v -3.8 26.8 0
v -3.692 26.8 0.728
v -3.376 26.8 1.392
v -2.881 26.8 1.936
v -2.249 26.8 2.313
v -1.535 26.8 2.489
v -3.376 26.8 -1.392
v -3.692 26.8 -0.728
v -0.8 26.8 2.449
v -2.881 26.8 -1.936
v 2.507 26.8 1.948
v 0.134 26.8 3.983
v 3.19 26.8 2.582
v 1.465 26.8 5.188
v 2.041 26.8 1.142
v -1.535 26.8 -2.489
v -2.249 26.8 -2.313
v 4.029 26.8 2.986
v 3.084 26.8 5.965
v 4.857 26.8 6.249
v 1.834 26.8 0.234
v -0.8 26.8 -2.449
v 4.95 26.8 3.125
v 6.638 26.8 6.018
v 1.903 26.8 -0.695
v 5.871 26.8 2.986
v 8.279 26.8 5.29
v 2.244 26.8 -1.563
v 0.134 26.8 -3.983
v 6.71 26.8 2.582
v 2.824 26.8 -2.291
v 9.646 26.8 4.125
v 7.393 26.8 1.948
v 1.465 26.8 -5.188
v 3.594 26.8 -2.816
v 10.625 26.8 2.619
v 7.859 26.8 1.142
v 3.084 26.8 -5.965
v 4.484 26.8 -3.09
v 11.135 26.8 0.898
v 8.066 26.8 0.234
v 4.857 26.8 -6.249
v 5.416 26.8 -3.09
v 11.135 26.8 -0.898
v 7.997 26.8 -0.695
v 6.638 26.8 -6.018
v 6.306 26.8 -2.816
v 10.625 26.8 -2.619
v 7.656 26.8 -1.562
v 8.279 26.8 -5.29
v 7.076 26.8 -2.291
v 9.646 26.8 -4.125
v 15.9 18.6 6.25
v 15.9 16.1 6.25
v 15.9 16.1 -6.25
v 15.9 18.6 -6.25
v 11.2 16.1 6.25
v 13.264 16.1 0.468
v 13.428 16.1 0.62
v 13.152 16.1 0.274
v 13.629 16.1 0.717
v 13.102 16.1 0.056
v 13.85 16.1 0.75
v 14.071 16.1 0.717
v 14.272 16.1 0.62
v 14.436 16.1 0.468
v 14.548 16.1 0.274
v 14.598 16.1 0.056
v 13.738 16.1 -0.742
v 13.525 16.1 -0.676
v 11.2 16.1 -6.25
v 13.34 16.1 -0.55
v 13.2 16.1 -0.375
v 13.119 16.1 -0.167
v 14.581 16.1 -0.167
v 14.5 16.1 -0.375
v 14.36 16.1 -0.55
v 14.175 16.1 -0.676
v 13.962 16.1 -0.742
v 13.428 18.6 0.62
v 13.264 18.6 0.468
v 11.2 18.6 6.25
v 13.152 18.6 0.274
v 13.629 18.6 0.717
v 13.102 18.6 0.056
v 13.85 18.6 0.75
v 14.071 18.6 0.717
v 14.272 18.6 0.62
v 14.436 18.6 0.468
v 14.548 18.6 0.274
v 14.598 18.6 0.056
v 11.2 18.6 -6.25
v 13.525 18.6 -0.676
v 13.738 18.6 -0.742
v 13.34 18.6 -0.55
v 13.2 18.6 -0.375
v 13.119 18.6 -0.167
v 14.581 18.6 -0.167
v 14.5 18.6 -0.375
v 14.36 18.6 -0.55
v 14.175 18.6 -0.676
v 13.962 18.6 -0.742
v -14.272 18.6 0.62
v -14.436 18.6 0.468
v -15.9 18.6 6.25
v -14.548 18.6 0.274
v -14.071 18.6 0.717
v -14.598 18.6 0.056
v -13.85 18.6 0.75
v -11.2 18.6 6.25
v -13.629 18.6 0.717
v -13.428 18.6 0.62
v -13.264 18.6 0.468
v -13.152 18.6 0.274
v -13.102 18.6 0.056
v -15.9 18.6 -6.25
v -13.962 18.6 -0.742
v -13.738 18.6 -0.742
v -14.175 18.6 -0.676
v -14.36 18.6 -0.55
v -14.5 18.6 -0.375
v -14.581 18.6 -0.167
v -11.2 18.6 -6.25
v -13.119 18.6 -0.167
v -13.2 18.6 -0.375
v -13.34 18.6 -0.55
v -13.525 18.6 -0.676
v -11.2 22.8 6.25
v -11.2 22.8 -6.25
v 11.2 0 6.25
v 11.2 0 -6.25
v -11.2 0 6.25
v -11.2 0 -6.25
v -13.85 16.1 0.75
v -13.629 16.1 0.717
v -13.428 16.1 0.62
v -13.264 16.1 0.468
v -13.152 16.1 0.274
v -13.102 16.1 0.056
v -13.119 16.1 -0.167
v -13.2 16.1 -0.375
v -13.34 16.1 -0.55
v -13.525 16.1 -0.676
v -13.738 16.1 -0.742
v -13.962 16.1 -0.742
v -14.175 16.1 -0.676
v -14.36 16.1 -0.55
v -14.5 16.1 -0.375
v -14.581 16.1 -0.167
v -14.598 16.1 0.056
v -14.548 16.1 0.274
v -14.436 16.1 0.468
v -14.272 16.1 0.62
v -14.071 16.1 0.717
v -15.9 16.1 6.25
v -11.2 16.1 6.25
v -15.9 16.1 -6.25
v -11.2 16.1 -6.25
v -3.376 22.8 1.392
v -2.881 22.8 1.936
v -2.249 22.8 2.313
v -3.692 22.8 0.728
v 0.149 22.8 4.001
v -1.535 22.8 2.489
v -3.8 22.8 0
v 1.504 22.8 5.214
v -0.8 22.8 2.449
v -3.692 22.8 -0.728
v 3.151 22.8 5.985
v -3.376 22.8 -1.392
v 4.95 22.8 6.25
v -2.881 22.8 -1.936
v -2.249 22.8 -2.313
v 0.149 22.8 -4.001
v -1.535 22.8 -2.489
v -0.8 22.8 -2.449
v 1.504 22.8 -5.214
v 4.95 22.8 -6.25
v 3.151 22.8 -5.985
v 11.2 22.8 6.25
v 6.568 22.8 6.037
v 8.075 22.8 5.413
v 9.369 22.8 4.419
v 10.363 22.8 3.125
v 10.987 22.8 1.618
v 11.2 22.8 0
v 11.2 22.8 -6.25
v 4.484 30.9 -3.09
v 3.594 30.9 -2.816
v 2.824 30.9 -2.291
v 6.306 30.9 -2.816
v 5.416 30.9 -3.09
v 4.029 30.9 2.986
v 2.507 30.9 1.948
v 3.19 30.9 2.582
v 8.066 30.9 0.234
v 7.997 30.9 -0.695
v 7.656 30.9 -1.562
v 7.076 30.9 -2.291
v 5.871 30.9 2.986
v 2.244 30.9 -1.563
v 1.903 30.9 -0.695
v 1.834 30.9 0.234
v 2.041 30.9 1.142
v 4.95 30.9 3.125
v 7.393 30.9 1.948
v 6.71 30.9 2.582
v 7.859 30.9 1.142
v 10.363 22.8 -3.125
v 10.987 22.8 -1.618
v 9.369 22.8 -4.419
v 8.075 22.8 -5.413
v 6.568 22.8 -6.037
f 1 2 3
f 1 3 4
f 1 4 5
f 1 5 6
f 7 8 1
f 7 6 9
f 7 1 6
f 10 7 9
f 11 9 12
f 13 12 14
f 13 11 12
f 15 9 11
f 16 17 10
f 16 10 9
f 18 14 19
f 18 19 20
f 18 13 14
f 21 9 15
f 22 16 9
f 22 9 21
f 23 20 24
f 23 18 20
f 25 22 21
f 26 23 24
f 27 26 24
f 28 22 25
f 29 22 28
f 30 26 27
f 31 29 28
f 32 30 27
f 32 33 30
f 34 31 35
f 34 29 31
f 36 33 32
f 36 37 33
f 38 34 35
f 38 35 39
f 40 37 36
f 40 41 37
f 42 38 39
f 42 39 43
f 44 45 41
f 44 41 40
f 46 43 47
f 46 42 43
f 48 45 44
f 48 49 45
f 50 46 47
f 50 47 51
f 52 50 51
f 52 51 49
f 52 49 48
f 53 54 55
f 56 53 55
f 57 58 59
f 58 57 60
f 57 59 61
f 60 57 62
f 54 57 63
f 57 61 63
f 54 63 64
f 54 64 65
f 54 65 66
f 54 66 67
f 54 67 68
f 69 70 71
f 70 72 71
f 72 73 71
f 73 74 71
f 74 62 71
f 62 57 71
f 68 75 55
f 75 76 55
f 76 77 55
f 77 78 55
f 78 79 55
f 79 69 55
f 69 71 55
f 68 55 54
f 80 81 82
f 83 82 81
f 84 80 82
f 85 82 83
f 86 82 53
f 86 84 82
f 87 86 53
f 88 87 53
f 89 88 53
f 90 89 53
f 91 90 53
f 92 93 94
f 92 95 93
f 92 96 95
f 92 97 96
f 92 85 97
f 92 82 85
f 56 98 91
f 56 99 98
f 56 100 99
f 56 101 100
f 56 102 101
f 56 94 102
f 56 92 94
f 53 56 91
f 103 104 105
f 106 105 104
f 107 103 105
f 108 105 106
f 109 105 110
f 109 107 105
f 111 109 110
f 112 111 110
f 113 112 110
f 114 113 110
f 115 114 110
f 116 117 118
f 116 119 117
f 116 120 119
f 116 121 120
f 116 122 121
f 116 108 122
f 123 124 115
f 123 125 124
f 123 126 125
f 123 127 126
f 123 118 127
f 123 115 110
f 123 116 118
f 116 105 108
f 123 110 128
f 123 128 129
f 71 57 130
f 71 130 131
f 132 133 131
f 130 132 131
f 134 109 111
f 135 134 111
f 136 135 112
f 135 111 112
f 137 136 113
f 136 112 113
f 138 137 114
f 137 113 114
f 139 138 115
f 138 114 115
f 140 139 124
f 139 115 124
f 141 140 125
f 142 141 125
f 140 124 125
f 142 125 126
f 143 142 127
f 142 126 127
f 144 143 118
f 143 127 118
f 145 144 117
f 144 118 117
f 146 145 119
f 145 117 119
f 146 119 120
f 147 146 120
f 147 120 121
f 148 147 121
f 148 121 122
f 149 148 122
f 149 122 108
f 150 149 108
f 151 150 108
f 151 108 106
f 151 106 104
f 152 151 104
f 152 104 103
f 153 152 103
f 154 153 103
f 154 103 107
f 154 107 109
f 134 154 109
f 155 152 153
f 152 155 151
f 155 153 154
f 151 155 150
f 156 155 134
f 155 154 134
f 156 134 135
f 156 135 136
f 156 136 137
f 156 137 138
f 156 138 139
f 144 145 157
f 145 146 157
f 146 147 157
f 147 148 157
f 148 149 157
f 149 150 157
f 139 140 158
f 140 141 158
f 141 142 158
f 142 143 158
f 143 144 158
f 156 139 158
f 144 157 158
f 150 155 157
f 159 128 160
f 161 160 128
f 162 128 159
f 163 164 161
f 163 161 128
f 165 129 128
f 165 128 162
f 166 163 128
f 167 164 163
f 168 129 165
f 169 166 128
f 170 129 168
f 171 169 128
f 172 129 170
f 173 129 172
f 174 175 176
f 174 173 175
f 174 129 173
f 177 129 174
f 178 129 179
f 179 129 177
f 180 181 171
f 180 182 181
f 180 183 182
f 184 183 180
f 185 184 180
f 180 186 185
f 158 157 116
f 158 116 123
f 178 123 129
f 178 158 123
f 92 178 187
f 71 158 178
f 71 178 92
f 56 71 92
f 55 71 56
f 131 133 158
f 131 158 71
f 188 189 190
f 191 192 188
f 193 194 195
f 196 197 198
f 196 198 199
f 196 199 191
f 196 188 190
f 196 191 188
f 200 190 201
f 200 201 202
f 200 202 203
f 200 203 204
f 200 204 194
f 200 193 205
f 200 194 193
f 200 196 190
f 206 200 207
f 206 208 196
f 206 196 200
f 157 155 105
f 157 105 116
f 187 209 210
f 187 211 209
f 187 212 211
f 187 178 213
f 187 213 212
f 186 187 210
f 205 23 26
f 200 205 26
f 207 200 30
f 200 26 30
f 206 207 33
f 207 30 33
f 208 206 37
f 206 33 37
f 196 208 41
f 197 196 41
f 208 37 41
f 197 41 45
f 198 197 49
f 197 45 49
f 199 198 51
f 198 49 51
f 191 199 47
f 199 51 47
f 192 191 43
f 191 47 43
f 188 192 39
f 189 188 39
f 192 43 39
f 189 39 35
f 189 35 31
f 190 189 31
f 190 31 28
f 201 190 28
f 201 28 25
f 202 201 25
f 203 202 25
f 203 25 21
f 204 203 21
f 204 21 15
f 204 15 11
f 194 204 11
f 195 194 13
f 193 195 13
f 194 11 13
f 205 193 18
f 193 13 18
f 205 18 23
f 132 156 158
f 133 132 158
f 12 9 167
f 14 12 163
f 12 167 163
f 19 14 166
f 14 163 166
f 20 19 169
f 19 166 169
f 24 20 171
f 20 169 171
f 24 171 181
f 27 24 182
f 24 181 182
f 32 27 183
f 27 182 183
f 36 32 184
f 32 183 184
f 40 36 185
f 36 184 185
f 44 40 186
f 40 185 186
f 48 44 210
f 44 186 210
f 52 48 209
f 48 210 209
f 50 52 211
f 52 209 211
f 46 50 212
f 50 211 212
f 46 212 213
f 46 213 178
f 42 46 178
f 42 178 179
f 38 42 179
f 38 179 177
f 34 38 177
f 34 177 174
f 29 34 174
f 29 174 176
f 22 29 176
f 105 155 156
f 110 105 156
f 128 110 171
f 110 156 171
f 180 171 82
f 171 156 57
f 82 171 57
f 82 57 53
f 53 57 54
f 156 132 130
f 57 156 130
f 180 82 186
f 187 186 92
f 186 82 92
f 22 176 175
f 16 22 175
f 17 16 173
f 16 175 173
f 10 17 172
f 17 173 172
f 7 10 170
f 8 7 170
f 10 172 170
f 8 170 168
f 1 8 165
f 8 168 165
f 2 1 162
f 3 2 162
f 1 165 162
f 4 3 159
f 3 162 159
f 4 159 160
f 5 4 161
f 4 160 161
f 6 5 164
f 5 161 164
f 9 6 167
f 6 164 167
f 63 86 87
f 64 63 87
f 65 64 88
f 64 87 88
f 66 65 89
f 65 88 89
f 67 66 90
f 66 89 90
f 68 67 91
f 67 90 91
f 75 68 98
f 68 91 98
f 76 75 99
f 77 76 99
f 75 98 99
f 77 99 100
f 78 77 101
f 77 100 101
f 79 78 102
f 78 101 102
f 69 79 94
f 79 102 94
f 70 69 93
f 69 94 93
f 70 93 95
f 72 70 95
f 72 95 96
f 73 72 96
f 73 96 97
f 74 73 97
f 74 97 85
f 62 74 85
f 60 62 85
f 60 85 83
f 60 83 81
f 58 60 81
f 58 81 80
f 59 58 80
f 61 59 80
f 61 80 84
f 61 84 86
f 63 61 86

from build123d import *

# Parameters (mm, degrees)
SKETCH_1_W          = 22.4
SKETCH_1_H          = 12.5
EXTRUDE_1_DEPTH     = 22.8
EXTRUDE_START       = 16.1
SKETCH_2_W          = 31.8
SKETCH_2_H          = 12.5
EXTRUDE_2_DEPTH     = 2.5
CUT_EXTRUDE_1_REACH = 27.255
SKETCH_3_R          = 0.75
EXTRUDE_3_DEPTH     = 4
SKETCH_6_R          = 3.125
EXTRUDE_4_DEPTH     = 4.1


with BuildPart() as part:
    # 草图1 → 凸台-拉伸1 (new body)
    with BuildSketch(Plane(origin=(0, 0, 0), x_dir=(1, 0, 0), z_dir=(0, 1, 0))):
        Rectangle(SKETCH_1_W, SKETCH_1_H)
    extrude(amount=EXTRUDE_1_DEPTH)

    # 草图2 → 凸台-拉伸2 (add)
    with BuildSketch(Plane(origin=(0, 0, 0), x_dir=(1, 0, 0), z_dir=(0, 1, 0)).offset(EXTRUDE_START)):
        Rectangle(SKETCH_2_W, SKETCH_2_H)
    extrude(amount=EXTRUDE_2_DEPTH)

    # 草图3 → 切除-拉伸1 (cut, up to next)
    with BuildSketch(Plane(origin=(0, 18.6, 0), x_dir=(1, 0, 0), z_dir=(0, 1, 0)), mode=Mode.PRIVATE) as cut_extrude_1_sk1:
        with Locations(Location((-13.85, 0, 0), (0, 0, 270))):
            Circle(SKETCH_3_R)
    cut_extrude_1_tool1 = extrude(cut_extrude_1_sk1.sketch, amount=-CUT_EXTRUDE_1_REACH, mode=Mode.PRIVATE) & part.part
    # 草图3 → 切除-拉伸1 (cut, up to next)
    with BuildSketch(Plane(origin=(0, 18.6, 0), x_dir=(1, 0, 0), z_dir=(0, 1, 0)), mode=Mode.PRIVATE) as cut_extrude_1_sk2:
        with Locations(Location((13.85, 0, 0), (0, 0, 270))):
            Circle(SKETCH_3_R)
    cut_extrude_1_tool2 = extrude(cut_extrude_1_sk2.sketch, amount=-CUT_EXTRUDE_1_REACH, mode=Mode.PRIVATE) & part.part
    add(cut_extrude_1_tool1.solids().sort_by_distance((-13.85, 18.6, 0))[0], mode=Mode.SUBTRACT)
    add(cut_extrude_1_tool2.solids().sort_by_distance((13.85, 18.6, 0))[0], mode=Mode.SUBTRACT)

    # 草图4 → 凸台-拉伸3 (add)
    with BuildSketch(Plane(origin=(0, 22.8, 0), x_dir=(1, 0, 0), z_dir=(0, 1, 0))):
        with BuildLine():
            ThreePointArc((-0.8, -2.449489743), (11.2, 0), (-0.8, 2.449489743))
            ThreePointArc((-0.8, 2.449489743), (-3.8, 0), (-0.8, -2.449489743))
        make_face()
    extrude(amount=EXTRUDE_3_DEPTH)

    # 草图6 → 凸台-拉伸4 (add)
    with BuildSketch(Plane(origin=(0, 26.8, 0), x_dir=(1, 0, 0), z_dir=(0, 1, 0))):
        with Locations(Location((4.95, 0, 0), (0, 0, 270))):
            Circle(SKETCH_6_R)
    extrude(amount=EXTRUDE_4_DEPTH)


solid = part.part
